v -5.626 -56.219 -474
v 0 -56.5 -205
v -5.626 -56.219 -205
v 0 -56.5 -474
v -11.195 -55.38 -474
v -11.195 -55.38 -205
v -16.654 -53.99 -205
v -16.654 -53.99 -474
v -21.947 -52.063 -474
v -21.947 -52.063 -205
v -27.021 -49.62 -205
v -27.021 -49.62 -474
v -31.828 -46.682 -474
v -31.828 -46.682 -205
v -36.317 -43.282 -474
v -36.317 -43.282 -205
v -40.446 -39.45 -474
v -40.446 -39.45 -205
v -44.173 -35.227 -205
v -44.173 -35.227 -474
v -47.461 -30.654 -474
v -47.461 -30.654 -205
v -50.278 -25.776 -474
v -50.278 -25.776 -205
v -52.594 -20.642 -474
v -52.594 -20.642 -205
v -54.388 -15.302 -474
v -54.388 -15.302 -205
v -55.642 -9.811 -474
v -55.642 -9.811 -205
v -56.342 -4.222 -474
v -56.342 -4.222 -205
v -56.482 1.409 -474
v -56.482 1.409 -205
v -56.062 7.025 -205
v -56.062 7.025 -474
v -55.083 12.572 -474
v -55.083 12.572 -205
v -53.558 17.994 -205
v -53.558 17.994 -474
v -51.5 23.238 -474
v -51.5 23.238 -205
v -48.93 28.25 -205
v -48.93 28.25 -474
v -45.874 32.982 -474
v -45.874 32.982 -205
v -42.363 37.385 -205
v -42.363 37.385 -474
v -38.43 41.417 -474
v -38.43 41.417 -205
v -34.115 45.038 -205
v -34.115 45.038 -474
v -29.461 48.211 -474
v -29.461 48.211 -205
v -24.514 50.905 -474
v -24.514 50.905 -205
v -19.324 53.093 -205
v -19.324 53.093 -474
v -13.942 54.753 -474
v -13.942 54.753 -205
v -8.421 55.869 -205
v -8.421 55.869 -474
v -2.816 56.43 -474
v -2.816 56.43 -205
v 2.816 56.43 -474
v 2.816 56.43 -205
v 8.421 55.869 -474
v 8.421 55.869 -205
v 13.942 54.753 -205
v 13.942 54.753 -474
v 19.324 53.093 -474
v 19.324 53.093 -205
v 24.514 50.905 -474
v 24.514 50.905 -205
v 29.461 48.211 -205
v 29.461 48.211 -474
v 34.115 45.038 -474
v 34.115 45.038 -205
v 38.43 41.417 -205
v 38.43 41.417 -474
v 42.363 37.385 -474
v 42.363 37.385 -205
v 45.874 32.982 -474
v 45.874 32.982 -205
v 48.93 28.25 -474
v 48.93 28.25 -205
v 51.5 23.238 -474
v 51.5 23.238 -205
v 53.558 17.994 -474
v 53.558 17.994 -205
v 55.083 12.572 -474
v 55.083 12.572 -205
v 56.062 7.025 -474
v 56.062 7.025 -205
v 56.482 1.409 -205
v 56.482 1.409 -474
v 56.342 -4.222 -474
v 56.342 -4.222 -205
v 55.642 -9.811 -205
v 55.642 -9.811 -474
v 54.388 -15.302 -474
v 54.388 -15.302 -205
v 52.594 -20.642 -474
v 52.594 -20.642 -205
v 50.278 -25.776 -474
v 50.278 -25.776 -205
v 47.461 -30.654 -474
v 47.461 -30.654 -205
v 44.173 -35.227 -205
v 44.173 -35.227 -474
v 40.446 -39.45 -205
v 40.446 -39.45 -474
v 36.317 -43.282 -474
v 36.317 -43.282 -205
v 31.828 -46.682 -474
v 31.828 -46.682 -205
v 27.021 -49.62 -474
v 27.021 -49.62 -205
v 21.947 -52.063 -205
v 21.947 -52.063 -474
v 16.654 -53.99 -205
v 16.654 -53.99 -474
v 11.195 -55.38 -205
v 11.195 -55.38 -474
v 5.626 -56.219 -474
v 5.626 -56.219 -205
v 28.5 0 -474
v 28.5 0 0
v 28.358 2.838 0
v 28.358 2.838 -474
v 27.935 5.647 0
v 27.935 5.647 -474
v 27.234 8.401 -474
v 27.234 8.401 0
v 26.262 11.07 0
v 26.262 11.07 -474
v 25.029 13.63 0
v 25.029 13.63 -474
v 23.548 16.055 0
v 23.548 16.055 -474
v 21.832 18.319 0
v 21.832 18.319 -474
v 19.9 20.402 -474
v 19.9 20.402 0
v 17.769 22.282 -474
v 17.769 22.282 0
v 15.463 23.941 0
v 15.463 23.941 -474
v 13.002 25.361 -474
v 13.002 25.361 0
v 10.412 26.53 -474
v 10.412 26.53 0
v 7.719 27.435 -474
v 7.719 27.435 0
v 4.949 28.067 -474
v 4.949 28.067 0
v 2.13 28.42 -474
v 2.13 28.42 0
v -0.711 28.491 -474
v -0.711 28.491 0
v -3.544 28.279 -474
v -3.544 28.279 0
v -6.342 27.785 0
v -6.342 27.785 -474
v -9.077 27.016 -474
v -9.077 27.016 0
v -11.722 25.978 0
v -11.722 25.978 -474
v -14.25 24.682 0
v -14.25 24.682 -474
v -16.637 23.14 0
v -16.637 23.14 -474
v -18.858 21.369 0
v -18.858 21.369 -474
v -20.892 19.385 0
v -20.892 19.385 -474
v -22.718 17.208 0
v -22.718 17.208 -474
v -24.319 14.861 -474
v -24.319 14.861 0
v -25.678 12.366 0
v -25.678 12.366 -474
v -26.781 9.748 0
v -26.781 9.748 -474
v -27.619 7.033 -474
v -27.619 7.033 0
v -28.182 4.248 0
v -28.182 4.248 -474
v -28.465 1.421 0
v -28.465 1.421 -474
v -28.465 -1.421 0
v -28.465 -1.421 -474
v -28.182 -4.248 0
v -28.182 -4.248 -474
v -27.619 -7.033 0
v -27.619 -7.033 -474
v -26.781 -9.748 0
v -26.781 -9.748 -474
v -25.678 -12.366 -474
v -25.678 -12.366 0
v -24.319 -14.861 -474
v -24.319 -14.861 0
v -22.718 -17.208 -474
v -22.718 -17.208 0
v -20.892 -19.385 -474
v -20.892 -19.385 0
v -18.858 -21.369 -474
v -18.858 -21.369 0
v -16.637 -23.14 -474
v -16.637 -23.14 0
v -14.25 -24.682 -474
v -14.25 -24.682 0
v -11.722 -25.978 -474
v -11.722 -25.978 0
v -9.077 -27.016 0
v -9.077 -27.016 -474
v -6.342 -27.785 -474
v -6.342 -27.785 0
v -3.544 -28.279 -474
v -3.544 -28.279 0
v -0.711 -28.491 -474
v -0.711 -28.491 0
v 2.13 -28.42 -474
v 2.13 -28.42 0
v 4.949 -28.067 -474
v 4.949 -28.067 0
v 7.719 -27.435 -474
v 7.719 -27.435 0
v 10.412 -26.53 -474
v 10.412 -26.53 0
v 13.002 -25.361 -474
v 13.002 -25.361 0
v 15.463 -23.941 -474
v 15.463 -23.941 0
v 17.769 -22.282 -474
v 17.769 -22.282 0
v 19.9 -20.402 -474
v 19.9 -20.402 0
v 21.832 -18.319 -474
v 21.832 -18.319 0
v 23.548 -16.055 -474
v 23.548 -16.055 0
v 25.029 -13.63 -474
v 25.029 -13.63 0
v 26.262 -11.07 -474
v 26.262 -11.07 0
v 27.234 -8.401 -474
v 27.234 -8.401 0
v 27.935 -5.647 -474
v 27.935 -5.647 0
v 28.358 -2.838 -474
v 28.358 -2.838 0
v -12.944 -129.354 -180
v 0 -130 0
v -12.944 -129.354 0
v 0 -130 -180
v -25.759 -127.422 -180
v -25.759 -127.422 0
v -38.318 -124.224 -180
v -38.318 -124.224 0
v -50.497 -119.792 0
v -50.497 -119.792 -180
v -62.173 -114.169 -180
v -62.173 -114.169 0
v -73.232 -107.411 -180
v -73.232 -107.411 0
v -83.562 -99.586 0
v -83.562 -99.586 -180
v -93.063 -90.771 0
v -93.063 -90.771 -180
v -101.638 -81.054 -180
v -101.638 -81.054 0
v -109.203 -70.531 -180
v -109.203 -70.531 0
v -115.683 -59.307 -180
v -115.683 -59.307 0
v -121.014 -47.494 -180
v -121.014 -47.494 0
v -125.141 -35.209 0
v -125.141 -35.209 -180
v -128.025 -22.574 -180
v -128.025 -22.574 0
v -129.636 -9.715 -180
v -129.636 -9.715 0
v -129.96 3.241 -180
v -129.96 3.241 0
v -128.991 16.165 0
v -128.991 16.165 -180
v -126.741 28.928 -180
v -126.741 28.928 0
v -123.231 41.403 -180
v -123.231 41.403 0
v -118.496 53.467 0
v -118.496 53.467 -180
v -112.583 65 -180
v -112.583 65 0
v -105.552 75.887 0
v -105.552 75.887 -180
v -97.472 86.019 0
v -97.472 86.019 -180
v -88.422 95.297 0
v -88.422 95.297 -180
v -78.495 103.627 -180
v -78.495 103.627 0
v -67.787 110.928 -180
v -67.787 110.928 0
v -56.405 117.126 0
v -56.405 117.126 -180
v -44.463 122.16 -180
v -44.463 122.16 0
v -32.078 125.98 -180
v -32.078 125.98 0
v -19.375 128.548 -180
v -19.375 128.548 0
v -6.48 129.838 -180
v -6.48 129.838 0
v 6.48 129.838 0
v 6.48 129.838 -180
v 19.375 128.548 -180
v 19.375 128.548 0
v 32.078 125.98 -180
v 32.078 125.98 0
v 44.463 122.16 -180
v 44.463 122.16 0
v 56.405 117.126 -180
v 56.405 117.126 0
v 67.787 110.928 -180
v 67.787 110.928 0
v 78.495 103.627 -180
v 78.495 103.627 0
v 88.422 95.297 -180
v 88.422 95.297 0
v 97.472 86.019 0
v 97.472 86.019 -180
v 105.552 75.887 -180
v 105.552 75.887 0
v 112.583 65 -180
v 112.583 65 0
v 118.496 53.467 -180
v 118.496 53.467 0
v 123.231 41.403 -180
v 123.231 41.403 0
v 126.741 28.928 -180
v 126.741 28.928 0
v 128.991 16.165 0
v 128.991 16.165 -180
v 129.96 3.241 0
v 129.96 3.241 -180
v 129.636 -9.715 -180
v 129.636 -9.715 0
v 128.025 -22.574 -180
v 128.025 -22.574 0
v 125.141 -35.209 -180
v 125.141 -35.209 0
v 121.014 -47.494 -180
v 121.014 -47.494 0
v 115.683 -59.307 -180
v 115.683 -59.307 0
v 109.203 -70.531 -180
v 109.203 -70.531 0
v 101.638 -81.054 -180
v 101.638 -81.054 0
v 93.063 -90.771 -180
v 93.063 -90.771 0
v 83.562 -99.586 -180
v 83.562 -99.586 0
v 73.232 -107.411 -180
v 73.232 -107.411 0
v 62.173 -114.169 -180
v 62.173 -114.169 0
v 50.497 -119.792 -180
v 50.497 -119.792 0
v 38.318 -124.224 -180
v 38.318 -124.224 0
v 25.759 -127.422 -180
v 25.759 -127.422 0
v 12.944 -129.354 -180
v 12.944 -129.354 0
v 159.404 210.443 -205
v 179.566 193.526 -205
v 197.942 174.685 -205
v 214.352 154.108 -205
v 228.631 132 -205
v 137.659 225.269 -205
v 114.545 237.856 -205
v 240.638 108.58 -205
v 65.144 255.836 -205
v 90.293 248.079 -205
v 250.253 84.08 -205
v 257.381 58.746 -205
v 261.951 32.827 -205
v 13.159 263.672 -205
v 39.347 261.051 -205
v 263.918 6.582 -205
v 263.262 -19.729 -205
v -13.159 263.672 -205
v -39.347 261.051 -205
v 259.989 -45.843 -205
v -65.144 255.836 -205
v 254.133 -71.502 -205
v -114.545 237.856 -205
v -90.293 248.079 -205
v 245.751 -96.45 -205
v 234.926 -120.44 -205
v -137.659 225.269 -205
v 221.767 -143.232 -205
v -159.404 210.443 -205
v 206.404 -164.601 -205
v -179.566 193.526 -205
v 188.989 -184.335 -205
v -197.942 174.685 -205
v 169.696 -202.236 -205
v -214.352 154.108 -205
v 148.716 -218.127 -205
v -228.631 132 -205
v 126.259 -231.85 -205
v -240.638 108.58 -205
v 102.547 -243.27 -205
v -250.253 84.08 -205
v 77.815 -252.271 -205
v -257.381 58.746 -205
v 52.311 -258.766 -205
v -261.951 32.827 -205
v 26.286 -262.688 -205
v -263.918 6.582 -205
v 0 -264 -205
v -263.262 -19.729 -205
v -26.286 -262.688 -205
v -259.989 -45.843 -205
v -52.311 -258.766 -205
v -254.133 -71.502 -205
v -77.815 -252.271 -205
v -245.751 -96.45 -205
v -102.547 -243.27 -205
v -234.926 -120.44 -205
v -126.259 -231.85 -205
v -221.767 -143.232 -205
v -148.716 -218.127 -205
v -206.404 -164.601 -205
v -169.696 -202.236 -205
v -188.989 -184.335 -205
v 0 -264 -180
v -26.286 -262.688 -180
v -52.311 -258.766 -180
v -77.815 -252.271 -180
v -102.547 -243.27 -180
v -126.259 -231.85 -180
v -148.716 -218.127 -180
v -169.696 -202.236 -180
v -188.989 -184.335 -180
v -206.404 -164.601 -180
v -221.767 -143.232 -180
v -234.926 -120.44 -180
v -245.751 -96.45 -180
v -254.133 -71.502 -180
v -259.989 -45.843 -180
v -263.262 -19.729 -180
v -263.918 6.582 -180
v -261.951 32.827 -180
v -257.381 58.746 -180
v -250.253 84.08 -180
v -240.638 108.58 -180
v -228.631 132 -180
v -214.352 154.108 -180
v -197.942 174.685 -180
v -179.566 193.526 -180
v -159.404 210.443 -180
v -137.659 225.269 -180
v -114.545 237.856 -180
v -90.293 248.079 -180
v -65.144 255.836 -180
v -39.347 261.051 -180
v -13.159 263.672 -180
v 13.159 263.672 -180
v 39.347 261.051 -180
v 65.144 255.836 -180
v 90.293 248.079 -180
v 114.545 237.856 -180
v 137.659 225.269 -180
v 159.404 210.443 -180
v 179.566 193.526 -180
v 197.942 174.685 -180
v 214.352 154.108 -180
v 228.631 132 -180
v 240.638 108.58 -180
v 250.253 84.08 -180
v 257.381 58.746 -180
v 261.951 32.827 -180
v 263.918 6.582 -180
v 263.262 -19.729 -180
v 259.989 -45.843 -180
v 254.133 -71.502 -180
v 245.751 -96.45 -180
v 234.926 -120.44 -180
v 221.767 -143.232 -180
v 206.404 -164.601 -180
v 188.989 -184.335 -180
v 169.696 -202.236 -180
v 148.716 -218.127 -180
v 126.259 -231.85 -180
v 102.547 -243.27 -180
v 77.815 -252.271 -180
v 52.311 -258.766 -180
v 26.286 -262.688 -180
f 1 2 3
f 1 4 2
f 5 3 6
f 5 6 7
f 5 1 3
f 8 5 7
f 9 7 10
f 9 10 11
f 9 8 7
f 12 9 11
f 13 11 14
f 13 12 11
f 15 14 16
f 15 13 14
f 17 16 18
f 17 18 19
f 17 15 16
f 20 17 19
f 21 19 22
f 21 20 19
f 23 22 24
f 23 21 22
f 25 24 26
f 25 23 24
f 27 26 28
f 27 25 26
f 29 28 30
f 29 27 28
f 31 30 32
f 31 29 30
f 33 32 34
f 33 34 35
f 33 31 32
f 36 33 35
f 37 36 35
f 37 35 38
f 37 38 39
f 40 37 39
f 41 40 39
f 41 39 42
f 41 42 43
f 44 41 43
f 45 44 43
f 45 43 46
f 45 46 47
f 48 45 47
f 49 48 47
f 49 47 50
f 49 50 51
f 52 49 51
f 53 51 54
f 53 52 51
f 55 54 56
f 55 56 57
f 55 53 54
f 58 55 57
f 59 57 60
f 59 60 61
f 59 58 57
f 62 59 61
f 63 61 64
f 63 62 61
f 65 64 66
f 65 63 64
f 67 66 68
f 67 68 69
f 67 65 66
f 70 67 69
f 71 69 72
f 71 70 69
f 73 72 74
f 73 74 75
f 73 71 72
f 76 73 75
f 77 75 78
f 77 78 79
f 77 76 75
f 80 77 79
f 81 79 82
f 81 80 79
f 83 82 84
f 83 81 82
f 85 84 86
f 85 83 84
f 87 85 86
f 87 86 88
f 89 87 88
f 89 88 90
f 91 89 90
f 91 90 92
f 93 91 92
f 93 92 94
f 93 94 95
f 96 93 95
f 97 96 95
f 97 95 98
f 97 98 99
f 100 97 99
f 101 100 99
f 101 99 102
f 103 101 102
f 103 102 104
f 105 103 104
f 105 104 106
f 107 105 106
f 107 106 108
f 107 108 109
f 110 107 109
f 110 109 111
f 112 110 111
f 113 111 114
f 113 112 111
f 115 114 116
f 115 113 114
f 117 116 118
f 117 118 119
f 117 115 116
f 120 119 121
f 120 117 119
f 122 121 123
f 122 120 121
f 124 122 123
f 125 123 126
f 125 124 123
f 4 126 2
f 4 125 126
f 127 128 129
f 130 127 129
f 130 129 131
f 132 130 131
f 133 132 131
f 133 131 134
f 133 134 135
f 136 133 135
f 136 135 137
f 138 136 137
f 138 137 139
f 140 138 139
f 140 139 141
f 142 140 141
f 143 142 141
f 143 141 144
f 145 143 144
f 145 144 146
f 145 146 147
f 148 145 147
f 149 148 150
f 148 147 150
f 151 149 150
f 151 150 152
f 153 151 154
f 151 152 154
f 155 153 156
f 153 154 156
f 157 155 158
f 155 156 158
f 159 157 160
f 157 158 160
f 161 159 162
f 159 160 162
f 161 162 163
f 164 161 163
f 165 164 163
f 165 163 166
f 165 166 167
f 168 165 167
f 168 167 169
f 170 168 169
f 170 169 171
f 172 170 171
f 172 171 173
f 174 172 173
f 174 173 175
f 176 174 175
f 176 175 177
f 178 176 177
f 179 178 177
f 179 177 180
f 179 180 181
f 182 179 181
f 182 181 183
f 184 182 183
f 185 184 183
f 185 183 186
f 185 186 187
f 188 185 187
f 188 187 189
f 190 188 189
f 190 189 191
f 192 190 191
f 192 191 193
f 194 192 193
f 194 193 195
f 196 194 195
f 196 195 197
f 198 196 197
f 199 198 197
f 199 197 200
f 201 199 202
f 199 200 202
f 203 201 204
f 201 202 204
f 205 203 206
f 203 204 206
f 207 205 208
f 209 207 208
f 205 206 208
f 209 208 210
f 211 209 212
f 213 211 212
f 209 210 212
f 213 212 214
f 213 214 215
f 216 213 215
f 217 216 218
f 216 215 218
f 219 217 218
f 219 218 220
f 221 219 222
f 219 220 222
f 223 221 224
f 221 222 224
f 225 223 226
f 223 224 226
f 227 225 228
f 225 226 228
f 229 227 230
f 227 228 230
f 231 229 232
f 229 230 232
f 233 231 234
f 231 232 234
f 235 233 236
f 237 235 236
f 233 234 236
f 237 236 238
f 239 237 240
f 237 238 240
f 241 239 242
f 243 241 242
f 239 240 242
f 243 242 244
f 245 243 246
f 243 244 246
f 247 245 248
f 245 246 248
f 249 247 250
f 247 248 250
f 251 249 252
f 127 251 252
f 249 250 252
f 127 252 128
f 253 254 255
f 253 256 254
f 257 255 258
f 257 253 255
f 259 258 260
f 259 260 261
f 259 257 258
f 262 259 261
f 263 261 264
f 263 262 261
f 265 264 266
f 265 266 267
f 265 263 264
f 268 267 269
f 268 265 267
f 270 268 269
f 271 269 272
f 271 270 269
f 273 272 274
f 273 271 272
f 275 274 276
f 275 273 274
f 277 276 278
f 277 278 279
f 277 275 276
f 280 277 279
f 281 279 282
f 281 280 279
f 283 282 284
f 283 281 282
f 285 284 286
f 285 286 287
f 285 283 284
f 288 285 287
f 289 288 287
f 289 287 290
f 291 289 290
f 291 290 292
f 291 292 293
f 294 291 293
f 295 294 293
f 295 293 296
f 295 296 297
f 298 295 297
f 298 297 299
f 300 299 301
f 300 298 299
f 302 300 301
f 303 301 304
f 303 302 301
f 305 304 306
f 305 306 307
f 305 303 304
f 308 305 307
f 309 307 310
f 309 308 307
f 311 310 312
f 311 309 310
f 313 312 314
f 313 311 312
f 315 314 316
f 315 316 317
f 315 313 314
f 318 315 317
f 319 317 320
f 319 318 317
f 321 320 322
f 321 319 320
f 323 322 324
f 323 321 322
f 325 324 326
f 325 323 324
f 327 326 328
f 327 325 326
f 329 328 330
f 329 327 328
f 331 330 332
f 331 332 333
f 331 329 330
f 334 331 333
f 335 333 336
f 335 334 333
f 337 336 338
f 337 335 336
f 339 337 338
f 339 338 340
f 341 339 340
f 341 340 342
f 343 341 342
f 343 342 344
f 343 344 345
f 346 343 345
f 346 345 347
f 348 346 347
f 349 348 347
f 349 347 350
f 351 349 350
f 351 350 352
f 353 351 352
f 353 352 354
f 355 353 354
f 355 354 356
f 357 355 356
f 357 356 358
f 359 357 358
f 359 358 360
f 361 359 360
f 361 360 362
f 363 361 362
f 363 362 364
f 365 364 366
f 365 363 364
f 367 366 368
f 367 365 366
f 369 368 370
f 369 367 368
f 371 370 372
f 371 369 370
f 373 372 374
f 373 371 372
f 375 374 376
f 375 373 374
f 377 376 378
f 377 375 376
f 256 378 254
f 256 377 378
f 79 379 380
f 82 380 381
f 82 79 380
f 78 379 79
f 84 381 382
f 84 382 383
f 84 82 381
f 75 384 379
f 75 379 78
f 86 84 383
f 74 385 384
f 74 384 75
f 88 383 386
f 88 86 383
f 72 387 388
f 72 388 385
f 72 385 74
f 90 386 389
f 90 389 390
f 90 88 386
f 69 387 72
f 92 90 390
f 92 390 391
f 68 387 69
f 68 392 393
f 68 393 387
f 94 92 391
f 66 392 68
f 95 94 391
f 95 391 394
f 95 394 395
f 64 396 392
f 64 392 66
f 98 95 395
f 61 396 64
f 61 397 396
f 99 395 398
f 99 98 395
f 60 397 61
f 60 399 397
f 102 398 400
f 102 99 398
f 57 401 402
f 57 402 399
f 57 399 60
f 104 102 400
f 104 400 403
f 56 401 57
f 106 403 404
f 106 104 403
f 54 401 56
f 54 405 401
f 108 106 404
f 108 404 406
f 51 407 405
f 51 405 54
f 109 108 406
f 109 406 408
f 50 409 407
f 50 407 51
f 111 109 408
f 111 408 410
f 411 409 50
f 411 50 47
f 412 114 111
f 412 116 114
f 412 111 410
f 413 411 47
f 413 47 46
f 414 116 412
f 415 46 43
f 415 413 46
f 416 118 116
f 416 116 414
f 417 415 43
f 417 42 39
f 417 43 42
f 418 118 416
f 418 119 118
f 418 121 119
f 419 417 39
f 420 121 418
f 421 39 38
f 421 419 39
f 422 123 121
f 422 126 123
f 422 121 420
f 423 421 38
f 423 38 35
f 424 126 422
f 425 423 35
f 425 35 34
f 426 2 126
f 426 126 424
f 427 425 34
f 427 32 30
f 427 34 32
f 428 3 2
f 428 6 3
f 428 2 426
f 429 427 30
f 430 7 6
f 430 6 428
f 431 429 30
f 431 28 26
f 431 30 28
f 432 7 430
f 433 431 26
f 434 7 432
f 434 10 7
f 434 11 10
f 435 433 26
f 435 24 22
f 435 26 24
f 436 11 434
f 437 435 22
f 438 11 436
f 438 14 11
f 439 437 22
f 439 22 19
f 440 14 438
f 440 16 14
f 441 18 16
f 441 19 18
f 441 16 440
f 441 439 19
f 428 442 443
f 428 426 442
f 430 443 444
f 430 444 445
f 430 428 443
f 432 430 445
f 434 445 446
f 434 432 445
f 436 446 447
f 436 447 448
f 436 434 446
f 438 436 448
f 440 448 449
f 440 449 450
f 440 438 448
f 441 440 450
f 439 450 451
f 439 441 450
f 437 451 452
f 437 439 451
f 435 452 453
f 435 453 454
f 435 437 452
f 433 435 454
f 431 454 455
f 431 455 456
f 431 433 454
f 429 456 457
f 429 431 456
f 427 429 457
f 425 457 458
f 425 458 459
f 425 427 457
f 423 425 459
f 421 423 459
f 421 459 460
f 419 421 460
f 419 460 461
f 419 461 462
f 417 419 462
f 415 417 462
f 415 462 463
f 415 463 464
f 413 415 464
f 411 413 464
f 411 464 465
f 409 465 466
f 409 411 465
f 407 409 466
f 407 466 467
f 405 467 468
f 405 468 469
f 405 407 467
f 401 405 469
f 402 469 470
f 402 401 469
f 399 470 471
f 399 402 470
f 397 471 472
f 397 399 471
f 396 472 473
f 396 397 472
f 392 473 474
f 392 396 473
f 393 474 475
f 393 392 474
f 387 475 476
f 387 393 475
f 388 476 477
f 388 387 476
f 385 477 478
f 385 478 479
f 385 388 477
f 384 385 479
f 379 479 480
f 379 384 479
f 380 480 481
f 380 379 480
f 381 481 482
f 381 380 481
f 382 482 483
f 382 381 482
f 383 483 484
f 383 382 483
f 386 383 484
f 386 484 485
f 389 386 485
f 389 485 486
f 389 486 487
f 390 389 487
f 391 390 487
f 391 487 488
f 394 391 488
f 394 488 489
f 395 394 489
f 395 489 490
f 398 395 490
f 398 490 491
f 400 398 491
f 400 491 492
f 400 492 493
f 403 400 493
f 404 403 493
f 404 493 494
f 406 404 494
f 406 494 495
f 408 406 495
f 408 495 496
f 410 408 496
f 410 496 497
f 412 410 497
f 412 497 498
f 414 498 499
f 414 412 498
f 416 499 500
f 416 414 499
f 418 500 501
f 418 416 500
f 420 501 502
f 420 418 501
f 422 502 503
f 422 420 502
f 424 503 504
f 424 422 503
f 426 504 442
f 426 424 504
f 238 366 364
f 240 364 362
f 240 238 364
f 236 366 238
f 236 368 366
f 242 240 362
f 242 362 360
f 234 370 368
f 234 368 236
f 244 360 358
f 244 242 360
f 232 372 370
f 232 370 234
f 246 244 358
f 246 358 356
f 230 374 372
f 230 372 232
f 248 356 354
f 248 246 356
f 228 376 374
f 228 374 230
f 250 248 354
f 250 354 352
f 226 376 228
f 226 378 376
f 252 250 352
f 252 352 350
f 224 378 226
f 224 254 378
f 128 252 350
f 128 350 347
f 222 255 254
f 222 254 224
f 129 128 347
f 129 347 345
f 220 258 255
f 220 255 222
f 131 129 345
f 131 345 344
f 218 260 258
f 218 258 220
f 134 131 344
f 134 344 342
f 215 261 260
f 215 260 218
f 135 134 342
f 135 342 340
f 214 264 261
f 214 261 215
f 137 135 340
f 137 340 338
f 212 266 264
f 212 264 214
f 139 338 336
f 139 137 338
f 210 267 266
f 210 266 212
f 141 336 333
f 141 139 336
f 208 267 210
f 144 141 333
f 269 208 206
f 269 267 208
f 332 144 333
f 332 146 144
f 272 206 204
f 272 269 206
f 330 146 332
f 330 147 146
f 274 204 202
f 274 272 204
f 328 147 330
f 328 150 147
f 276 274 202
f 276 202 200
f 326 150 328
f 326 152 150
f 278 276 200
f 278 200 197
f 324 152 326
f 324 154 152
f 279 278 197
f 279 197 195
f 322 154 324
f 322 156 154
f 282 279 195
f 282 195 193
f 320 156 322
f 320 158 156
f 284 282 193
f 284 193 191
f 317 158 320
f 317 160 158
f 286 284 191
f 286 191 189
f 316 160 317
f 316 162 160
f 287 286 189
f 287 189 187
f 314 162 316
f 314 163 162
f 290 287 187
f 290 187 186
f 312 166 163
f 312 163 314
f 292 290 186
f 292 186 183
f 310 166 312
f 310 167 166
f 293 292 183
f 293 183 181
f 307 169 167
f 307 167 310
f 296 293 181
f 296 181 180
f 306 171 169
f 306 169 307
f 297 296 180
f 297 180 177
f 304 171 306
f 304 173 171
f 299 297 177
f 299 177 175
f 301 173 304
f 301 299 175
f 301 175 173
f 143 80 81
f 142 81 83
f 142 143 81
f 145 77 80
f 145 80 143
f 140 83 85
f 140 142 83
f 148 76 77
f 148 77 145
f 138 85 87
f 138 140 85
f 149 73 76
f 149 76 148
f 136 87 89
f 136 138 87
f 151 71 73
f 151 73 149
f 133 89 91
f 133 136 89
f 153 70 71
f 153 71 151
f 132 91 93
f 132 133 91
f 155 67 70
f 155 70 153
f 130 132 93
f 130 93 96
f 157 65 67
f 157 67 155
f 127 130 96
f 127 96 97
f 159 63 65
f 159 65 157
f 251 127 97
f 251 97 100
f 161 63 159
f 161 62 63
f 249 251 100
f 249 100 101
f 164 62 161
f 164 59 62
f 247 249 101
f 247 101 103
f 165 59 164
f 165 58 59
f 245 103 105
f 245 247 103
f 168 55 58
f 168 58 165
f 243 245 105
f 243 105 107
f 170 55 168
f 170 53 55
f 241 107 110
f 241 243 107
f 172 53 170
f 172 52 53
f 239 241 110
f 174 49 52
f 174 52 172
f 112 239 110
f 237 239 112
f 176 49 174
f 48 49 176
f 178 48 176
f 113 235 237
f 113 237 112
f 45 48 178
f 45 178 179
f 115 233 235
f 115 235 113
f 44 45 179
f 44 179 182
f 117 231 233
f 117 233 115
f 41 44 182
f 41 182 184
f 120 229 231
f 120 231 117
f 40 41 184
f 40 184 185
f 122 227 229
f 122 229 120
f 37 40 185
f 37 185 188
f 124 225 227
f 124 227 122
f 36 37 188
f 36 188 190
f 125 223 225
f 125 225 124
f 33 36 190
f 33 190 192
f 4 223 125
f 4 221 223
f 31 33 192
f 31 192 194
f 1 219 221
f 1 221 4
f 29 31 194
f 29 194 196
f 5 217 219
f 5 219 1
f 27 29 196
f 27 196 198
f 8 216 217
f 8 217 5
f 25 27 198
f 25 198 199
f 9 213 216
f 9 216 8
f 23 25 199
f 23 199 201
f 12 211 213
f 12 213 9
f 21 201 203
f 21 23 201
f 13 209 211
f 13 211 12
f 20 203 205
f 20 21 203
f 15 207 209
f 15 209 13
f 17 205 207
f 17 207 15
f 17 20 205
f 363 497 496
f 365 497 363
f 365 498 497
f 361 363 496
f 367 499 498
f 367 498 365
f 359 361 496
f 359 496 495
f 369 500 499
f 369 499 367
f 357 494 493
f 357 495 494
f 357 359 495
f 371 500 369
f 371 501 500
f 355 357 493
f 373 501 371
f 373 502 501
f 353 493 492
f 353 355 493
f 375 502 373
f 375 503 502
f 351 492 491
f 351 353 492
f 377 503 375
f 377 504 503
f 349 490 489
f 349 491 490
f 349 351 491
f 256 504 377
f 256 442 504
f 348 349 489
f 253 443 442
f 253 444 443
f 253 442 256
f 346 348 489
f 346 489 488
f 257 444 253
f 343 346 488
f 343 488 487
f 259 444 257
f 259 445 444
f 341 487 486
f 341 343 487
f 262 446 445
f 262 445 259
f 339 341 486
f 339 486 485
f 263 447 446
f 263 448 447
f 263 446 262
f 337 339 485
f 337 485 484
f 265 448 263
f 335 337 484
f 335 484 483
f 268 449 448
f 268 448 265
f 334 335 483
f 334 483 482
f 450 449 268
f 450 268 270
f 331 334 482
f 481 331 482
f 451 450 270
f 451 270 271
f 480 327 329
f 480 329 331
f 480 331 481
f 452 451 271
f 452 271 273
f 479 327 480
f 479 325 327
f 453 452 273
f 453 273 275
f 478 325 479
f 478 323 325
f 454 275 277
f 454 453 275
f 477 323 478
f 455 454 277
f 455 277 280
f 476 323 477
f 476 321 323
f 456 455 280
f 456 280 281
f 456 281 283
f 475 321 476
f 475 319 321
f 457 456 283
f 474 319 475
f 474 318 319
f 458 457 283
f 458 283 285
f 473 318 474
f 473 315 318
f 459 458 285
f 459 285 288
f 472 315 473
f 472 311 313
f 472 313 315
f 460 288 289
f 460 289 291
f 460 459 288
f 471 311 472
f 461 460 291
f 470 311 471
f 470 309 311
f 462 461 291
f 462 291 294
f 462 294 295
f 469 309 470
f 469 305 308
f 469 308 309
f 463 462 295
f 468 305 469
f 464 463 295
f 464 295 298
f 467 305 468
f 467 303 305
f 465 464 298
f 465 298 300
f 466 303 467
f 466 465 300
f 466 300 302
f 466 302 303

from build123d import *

# Parameters (mm, degrees)
SKETCH2_R          = 28.5
CUT_EXTRUDE1_DEPTH = 604.380476979


with BuildPart() as part:
    # Sketch1 → Revolve1 (revolve)
    with BuildSketch(Plane(origin=(0, 0, 0), x_dir=(0, 0, -1), z_dir=(1, 0, 0)), mode=Mode.PRIVATE) as revolve1_sk:
        Polygon((0, 0), (0, 130), (180, 130), (180, 264), (205, 264), (205, 56.5), (474, 56.5), (474, 0), align=None)
    revolve(revolve1_sk.sketch.rotate(Axis((0, 0, 0), (0, 0, -1)), 180), axis=Axis((0, 0, 0), (0, 0, -1)))

    # Sketch2 → Cut-Extrude1 (cut, through all)
    with BuildSketch(Plane.XY):
        Circle(SKETCH2_R)
    extrude(amount=-CUT_EXTRUDE1_DEPTH, mode=Mode.SUBTRACT)


solid = part.part
